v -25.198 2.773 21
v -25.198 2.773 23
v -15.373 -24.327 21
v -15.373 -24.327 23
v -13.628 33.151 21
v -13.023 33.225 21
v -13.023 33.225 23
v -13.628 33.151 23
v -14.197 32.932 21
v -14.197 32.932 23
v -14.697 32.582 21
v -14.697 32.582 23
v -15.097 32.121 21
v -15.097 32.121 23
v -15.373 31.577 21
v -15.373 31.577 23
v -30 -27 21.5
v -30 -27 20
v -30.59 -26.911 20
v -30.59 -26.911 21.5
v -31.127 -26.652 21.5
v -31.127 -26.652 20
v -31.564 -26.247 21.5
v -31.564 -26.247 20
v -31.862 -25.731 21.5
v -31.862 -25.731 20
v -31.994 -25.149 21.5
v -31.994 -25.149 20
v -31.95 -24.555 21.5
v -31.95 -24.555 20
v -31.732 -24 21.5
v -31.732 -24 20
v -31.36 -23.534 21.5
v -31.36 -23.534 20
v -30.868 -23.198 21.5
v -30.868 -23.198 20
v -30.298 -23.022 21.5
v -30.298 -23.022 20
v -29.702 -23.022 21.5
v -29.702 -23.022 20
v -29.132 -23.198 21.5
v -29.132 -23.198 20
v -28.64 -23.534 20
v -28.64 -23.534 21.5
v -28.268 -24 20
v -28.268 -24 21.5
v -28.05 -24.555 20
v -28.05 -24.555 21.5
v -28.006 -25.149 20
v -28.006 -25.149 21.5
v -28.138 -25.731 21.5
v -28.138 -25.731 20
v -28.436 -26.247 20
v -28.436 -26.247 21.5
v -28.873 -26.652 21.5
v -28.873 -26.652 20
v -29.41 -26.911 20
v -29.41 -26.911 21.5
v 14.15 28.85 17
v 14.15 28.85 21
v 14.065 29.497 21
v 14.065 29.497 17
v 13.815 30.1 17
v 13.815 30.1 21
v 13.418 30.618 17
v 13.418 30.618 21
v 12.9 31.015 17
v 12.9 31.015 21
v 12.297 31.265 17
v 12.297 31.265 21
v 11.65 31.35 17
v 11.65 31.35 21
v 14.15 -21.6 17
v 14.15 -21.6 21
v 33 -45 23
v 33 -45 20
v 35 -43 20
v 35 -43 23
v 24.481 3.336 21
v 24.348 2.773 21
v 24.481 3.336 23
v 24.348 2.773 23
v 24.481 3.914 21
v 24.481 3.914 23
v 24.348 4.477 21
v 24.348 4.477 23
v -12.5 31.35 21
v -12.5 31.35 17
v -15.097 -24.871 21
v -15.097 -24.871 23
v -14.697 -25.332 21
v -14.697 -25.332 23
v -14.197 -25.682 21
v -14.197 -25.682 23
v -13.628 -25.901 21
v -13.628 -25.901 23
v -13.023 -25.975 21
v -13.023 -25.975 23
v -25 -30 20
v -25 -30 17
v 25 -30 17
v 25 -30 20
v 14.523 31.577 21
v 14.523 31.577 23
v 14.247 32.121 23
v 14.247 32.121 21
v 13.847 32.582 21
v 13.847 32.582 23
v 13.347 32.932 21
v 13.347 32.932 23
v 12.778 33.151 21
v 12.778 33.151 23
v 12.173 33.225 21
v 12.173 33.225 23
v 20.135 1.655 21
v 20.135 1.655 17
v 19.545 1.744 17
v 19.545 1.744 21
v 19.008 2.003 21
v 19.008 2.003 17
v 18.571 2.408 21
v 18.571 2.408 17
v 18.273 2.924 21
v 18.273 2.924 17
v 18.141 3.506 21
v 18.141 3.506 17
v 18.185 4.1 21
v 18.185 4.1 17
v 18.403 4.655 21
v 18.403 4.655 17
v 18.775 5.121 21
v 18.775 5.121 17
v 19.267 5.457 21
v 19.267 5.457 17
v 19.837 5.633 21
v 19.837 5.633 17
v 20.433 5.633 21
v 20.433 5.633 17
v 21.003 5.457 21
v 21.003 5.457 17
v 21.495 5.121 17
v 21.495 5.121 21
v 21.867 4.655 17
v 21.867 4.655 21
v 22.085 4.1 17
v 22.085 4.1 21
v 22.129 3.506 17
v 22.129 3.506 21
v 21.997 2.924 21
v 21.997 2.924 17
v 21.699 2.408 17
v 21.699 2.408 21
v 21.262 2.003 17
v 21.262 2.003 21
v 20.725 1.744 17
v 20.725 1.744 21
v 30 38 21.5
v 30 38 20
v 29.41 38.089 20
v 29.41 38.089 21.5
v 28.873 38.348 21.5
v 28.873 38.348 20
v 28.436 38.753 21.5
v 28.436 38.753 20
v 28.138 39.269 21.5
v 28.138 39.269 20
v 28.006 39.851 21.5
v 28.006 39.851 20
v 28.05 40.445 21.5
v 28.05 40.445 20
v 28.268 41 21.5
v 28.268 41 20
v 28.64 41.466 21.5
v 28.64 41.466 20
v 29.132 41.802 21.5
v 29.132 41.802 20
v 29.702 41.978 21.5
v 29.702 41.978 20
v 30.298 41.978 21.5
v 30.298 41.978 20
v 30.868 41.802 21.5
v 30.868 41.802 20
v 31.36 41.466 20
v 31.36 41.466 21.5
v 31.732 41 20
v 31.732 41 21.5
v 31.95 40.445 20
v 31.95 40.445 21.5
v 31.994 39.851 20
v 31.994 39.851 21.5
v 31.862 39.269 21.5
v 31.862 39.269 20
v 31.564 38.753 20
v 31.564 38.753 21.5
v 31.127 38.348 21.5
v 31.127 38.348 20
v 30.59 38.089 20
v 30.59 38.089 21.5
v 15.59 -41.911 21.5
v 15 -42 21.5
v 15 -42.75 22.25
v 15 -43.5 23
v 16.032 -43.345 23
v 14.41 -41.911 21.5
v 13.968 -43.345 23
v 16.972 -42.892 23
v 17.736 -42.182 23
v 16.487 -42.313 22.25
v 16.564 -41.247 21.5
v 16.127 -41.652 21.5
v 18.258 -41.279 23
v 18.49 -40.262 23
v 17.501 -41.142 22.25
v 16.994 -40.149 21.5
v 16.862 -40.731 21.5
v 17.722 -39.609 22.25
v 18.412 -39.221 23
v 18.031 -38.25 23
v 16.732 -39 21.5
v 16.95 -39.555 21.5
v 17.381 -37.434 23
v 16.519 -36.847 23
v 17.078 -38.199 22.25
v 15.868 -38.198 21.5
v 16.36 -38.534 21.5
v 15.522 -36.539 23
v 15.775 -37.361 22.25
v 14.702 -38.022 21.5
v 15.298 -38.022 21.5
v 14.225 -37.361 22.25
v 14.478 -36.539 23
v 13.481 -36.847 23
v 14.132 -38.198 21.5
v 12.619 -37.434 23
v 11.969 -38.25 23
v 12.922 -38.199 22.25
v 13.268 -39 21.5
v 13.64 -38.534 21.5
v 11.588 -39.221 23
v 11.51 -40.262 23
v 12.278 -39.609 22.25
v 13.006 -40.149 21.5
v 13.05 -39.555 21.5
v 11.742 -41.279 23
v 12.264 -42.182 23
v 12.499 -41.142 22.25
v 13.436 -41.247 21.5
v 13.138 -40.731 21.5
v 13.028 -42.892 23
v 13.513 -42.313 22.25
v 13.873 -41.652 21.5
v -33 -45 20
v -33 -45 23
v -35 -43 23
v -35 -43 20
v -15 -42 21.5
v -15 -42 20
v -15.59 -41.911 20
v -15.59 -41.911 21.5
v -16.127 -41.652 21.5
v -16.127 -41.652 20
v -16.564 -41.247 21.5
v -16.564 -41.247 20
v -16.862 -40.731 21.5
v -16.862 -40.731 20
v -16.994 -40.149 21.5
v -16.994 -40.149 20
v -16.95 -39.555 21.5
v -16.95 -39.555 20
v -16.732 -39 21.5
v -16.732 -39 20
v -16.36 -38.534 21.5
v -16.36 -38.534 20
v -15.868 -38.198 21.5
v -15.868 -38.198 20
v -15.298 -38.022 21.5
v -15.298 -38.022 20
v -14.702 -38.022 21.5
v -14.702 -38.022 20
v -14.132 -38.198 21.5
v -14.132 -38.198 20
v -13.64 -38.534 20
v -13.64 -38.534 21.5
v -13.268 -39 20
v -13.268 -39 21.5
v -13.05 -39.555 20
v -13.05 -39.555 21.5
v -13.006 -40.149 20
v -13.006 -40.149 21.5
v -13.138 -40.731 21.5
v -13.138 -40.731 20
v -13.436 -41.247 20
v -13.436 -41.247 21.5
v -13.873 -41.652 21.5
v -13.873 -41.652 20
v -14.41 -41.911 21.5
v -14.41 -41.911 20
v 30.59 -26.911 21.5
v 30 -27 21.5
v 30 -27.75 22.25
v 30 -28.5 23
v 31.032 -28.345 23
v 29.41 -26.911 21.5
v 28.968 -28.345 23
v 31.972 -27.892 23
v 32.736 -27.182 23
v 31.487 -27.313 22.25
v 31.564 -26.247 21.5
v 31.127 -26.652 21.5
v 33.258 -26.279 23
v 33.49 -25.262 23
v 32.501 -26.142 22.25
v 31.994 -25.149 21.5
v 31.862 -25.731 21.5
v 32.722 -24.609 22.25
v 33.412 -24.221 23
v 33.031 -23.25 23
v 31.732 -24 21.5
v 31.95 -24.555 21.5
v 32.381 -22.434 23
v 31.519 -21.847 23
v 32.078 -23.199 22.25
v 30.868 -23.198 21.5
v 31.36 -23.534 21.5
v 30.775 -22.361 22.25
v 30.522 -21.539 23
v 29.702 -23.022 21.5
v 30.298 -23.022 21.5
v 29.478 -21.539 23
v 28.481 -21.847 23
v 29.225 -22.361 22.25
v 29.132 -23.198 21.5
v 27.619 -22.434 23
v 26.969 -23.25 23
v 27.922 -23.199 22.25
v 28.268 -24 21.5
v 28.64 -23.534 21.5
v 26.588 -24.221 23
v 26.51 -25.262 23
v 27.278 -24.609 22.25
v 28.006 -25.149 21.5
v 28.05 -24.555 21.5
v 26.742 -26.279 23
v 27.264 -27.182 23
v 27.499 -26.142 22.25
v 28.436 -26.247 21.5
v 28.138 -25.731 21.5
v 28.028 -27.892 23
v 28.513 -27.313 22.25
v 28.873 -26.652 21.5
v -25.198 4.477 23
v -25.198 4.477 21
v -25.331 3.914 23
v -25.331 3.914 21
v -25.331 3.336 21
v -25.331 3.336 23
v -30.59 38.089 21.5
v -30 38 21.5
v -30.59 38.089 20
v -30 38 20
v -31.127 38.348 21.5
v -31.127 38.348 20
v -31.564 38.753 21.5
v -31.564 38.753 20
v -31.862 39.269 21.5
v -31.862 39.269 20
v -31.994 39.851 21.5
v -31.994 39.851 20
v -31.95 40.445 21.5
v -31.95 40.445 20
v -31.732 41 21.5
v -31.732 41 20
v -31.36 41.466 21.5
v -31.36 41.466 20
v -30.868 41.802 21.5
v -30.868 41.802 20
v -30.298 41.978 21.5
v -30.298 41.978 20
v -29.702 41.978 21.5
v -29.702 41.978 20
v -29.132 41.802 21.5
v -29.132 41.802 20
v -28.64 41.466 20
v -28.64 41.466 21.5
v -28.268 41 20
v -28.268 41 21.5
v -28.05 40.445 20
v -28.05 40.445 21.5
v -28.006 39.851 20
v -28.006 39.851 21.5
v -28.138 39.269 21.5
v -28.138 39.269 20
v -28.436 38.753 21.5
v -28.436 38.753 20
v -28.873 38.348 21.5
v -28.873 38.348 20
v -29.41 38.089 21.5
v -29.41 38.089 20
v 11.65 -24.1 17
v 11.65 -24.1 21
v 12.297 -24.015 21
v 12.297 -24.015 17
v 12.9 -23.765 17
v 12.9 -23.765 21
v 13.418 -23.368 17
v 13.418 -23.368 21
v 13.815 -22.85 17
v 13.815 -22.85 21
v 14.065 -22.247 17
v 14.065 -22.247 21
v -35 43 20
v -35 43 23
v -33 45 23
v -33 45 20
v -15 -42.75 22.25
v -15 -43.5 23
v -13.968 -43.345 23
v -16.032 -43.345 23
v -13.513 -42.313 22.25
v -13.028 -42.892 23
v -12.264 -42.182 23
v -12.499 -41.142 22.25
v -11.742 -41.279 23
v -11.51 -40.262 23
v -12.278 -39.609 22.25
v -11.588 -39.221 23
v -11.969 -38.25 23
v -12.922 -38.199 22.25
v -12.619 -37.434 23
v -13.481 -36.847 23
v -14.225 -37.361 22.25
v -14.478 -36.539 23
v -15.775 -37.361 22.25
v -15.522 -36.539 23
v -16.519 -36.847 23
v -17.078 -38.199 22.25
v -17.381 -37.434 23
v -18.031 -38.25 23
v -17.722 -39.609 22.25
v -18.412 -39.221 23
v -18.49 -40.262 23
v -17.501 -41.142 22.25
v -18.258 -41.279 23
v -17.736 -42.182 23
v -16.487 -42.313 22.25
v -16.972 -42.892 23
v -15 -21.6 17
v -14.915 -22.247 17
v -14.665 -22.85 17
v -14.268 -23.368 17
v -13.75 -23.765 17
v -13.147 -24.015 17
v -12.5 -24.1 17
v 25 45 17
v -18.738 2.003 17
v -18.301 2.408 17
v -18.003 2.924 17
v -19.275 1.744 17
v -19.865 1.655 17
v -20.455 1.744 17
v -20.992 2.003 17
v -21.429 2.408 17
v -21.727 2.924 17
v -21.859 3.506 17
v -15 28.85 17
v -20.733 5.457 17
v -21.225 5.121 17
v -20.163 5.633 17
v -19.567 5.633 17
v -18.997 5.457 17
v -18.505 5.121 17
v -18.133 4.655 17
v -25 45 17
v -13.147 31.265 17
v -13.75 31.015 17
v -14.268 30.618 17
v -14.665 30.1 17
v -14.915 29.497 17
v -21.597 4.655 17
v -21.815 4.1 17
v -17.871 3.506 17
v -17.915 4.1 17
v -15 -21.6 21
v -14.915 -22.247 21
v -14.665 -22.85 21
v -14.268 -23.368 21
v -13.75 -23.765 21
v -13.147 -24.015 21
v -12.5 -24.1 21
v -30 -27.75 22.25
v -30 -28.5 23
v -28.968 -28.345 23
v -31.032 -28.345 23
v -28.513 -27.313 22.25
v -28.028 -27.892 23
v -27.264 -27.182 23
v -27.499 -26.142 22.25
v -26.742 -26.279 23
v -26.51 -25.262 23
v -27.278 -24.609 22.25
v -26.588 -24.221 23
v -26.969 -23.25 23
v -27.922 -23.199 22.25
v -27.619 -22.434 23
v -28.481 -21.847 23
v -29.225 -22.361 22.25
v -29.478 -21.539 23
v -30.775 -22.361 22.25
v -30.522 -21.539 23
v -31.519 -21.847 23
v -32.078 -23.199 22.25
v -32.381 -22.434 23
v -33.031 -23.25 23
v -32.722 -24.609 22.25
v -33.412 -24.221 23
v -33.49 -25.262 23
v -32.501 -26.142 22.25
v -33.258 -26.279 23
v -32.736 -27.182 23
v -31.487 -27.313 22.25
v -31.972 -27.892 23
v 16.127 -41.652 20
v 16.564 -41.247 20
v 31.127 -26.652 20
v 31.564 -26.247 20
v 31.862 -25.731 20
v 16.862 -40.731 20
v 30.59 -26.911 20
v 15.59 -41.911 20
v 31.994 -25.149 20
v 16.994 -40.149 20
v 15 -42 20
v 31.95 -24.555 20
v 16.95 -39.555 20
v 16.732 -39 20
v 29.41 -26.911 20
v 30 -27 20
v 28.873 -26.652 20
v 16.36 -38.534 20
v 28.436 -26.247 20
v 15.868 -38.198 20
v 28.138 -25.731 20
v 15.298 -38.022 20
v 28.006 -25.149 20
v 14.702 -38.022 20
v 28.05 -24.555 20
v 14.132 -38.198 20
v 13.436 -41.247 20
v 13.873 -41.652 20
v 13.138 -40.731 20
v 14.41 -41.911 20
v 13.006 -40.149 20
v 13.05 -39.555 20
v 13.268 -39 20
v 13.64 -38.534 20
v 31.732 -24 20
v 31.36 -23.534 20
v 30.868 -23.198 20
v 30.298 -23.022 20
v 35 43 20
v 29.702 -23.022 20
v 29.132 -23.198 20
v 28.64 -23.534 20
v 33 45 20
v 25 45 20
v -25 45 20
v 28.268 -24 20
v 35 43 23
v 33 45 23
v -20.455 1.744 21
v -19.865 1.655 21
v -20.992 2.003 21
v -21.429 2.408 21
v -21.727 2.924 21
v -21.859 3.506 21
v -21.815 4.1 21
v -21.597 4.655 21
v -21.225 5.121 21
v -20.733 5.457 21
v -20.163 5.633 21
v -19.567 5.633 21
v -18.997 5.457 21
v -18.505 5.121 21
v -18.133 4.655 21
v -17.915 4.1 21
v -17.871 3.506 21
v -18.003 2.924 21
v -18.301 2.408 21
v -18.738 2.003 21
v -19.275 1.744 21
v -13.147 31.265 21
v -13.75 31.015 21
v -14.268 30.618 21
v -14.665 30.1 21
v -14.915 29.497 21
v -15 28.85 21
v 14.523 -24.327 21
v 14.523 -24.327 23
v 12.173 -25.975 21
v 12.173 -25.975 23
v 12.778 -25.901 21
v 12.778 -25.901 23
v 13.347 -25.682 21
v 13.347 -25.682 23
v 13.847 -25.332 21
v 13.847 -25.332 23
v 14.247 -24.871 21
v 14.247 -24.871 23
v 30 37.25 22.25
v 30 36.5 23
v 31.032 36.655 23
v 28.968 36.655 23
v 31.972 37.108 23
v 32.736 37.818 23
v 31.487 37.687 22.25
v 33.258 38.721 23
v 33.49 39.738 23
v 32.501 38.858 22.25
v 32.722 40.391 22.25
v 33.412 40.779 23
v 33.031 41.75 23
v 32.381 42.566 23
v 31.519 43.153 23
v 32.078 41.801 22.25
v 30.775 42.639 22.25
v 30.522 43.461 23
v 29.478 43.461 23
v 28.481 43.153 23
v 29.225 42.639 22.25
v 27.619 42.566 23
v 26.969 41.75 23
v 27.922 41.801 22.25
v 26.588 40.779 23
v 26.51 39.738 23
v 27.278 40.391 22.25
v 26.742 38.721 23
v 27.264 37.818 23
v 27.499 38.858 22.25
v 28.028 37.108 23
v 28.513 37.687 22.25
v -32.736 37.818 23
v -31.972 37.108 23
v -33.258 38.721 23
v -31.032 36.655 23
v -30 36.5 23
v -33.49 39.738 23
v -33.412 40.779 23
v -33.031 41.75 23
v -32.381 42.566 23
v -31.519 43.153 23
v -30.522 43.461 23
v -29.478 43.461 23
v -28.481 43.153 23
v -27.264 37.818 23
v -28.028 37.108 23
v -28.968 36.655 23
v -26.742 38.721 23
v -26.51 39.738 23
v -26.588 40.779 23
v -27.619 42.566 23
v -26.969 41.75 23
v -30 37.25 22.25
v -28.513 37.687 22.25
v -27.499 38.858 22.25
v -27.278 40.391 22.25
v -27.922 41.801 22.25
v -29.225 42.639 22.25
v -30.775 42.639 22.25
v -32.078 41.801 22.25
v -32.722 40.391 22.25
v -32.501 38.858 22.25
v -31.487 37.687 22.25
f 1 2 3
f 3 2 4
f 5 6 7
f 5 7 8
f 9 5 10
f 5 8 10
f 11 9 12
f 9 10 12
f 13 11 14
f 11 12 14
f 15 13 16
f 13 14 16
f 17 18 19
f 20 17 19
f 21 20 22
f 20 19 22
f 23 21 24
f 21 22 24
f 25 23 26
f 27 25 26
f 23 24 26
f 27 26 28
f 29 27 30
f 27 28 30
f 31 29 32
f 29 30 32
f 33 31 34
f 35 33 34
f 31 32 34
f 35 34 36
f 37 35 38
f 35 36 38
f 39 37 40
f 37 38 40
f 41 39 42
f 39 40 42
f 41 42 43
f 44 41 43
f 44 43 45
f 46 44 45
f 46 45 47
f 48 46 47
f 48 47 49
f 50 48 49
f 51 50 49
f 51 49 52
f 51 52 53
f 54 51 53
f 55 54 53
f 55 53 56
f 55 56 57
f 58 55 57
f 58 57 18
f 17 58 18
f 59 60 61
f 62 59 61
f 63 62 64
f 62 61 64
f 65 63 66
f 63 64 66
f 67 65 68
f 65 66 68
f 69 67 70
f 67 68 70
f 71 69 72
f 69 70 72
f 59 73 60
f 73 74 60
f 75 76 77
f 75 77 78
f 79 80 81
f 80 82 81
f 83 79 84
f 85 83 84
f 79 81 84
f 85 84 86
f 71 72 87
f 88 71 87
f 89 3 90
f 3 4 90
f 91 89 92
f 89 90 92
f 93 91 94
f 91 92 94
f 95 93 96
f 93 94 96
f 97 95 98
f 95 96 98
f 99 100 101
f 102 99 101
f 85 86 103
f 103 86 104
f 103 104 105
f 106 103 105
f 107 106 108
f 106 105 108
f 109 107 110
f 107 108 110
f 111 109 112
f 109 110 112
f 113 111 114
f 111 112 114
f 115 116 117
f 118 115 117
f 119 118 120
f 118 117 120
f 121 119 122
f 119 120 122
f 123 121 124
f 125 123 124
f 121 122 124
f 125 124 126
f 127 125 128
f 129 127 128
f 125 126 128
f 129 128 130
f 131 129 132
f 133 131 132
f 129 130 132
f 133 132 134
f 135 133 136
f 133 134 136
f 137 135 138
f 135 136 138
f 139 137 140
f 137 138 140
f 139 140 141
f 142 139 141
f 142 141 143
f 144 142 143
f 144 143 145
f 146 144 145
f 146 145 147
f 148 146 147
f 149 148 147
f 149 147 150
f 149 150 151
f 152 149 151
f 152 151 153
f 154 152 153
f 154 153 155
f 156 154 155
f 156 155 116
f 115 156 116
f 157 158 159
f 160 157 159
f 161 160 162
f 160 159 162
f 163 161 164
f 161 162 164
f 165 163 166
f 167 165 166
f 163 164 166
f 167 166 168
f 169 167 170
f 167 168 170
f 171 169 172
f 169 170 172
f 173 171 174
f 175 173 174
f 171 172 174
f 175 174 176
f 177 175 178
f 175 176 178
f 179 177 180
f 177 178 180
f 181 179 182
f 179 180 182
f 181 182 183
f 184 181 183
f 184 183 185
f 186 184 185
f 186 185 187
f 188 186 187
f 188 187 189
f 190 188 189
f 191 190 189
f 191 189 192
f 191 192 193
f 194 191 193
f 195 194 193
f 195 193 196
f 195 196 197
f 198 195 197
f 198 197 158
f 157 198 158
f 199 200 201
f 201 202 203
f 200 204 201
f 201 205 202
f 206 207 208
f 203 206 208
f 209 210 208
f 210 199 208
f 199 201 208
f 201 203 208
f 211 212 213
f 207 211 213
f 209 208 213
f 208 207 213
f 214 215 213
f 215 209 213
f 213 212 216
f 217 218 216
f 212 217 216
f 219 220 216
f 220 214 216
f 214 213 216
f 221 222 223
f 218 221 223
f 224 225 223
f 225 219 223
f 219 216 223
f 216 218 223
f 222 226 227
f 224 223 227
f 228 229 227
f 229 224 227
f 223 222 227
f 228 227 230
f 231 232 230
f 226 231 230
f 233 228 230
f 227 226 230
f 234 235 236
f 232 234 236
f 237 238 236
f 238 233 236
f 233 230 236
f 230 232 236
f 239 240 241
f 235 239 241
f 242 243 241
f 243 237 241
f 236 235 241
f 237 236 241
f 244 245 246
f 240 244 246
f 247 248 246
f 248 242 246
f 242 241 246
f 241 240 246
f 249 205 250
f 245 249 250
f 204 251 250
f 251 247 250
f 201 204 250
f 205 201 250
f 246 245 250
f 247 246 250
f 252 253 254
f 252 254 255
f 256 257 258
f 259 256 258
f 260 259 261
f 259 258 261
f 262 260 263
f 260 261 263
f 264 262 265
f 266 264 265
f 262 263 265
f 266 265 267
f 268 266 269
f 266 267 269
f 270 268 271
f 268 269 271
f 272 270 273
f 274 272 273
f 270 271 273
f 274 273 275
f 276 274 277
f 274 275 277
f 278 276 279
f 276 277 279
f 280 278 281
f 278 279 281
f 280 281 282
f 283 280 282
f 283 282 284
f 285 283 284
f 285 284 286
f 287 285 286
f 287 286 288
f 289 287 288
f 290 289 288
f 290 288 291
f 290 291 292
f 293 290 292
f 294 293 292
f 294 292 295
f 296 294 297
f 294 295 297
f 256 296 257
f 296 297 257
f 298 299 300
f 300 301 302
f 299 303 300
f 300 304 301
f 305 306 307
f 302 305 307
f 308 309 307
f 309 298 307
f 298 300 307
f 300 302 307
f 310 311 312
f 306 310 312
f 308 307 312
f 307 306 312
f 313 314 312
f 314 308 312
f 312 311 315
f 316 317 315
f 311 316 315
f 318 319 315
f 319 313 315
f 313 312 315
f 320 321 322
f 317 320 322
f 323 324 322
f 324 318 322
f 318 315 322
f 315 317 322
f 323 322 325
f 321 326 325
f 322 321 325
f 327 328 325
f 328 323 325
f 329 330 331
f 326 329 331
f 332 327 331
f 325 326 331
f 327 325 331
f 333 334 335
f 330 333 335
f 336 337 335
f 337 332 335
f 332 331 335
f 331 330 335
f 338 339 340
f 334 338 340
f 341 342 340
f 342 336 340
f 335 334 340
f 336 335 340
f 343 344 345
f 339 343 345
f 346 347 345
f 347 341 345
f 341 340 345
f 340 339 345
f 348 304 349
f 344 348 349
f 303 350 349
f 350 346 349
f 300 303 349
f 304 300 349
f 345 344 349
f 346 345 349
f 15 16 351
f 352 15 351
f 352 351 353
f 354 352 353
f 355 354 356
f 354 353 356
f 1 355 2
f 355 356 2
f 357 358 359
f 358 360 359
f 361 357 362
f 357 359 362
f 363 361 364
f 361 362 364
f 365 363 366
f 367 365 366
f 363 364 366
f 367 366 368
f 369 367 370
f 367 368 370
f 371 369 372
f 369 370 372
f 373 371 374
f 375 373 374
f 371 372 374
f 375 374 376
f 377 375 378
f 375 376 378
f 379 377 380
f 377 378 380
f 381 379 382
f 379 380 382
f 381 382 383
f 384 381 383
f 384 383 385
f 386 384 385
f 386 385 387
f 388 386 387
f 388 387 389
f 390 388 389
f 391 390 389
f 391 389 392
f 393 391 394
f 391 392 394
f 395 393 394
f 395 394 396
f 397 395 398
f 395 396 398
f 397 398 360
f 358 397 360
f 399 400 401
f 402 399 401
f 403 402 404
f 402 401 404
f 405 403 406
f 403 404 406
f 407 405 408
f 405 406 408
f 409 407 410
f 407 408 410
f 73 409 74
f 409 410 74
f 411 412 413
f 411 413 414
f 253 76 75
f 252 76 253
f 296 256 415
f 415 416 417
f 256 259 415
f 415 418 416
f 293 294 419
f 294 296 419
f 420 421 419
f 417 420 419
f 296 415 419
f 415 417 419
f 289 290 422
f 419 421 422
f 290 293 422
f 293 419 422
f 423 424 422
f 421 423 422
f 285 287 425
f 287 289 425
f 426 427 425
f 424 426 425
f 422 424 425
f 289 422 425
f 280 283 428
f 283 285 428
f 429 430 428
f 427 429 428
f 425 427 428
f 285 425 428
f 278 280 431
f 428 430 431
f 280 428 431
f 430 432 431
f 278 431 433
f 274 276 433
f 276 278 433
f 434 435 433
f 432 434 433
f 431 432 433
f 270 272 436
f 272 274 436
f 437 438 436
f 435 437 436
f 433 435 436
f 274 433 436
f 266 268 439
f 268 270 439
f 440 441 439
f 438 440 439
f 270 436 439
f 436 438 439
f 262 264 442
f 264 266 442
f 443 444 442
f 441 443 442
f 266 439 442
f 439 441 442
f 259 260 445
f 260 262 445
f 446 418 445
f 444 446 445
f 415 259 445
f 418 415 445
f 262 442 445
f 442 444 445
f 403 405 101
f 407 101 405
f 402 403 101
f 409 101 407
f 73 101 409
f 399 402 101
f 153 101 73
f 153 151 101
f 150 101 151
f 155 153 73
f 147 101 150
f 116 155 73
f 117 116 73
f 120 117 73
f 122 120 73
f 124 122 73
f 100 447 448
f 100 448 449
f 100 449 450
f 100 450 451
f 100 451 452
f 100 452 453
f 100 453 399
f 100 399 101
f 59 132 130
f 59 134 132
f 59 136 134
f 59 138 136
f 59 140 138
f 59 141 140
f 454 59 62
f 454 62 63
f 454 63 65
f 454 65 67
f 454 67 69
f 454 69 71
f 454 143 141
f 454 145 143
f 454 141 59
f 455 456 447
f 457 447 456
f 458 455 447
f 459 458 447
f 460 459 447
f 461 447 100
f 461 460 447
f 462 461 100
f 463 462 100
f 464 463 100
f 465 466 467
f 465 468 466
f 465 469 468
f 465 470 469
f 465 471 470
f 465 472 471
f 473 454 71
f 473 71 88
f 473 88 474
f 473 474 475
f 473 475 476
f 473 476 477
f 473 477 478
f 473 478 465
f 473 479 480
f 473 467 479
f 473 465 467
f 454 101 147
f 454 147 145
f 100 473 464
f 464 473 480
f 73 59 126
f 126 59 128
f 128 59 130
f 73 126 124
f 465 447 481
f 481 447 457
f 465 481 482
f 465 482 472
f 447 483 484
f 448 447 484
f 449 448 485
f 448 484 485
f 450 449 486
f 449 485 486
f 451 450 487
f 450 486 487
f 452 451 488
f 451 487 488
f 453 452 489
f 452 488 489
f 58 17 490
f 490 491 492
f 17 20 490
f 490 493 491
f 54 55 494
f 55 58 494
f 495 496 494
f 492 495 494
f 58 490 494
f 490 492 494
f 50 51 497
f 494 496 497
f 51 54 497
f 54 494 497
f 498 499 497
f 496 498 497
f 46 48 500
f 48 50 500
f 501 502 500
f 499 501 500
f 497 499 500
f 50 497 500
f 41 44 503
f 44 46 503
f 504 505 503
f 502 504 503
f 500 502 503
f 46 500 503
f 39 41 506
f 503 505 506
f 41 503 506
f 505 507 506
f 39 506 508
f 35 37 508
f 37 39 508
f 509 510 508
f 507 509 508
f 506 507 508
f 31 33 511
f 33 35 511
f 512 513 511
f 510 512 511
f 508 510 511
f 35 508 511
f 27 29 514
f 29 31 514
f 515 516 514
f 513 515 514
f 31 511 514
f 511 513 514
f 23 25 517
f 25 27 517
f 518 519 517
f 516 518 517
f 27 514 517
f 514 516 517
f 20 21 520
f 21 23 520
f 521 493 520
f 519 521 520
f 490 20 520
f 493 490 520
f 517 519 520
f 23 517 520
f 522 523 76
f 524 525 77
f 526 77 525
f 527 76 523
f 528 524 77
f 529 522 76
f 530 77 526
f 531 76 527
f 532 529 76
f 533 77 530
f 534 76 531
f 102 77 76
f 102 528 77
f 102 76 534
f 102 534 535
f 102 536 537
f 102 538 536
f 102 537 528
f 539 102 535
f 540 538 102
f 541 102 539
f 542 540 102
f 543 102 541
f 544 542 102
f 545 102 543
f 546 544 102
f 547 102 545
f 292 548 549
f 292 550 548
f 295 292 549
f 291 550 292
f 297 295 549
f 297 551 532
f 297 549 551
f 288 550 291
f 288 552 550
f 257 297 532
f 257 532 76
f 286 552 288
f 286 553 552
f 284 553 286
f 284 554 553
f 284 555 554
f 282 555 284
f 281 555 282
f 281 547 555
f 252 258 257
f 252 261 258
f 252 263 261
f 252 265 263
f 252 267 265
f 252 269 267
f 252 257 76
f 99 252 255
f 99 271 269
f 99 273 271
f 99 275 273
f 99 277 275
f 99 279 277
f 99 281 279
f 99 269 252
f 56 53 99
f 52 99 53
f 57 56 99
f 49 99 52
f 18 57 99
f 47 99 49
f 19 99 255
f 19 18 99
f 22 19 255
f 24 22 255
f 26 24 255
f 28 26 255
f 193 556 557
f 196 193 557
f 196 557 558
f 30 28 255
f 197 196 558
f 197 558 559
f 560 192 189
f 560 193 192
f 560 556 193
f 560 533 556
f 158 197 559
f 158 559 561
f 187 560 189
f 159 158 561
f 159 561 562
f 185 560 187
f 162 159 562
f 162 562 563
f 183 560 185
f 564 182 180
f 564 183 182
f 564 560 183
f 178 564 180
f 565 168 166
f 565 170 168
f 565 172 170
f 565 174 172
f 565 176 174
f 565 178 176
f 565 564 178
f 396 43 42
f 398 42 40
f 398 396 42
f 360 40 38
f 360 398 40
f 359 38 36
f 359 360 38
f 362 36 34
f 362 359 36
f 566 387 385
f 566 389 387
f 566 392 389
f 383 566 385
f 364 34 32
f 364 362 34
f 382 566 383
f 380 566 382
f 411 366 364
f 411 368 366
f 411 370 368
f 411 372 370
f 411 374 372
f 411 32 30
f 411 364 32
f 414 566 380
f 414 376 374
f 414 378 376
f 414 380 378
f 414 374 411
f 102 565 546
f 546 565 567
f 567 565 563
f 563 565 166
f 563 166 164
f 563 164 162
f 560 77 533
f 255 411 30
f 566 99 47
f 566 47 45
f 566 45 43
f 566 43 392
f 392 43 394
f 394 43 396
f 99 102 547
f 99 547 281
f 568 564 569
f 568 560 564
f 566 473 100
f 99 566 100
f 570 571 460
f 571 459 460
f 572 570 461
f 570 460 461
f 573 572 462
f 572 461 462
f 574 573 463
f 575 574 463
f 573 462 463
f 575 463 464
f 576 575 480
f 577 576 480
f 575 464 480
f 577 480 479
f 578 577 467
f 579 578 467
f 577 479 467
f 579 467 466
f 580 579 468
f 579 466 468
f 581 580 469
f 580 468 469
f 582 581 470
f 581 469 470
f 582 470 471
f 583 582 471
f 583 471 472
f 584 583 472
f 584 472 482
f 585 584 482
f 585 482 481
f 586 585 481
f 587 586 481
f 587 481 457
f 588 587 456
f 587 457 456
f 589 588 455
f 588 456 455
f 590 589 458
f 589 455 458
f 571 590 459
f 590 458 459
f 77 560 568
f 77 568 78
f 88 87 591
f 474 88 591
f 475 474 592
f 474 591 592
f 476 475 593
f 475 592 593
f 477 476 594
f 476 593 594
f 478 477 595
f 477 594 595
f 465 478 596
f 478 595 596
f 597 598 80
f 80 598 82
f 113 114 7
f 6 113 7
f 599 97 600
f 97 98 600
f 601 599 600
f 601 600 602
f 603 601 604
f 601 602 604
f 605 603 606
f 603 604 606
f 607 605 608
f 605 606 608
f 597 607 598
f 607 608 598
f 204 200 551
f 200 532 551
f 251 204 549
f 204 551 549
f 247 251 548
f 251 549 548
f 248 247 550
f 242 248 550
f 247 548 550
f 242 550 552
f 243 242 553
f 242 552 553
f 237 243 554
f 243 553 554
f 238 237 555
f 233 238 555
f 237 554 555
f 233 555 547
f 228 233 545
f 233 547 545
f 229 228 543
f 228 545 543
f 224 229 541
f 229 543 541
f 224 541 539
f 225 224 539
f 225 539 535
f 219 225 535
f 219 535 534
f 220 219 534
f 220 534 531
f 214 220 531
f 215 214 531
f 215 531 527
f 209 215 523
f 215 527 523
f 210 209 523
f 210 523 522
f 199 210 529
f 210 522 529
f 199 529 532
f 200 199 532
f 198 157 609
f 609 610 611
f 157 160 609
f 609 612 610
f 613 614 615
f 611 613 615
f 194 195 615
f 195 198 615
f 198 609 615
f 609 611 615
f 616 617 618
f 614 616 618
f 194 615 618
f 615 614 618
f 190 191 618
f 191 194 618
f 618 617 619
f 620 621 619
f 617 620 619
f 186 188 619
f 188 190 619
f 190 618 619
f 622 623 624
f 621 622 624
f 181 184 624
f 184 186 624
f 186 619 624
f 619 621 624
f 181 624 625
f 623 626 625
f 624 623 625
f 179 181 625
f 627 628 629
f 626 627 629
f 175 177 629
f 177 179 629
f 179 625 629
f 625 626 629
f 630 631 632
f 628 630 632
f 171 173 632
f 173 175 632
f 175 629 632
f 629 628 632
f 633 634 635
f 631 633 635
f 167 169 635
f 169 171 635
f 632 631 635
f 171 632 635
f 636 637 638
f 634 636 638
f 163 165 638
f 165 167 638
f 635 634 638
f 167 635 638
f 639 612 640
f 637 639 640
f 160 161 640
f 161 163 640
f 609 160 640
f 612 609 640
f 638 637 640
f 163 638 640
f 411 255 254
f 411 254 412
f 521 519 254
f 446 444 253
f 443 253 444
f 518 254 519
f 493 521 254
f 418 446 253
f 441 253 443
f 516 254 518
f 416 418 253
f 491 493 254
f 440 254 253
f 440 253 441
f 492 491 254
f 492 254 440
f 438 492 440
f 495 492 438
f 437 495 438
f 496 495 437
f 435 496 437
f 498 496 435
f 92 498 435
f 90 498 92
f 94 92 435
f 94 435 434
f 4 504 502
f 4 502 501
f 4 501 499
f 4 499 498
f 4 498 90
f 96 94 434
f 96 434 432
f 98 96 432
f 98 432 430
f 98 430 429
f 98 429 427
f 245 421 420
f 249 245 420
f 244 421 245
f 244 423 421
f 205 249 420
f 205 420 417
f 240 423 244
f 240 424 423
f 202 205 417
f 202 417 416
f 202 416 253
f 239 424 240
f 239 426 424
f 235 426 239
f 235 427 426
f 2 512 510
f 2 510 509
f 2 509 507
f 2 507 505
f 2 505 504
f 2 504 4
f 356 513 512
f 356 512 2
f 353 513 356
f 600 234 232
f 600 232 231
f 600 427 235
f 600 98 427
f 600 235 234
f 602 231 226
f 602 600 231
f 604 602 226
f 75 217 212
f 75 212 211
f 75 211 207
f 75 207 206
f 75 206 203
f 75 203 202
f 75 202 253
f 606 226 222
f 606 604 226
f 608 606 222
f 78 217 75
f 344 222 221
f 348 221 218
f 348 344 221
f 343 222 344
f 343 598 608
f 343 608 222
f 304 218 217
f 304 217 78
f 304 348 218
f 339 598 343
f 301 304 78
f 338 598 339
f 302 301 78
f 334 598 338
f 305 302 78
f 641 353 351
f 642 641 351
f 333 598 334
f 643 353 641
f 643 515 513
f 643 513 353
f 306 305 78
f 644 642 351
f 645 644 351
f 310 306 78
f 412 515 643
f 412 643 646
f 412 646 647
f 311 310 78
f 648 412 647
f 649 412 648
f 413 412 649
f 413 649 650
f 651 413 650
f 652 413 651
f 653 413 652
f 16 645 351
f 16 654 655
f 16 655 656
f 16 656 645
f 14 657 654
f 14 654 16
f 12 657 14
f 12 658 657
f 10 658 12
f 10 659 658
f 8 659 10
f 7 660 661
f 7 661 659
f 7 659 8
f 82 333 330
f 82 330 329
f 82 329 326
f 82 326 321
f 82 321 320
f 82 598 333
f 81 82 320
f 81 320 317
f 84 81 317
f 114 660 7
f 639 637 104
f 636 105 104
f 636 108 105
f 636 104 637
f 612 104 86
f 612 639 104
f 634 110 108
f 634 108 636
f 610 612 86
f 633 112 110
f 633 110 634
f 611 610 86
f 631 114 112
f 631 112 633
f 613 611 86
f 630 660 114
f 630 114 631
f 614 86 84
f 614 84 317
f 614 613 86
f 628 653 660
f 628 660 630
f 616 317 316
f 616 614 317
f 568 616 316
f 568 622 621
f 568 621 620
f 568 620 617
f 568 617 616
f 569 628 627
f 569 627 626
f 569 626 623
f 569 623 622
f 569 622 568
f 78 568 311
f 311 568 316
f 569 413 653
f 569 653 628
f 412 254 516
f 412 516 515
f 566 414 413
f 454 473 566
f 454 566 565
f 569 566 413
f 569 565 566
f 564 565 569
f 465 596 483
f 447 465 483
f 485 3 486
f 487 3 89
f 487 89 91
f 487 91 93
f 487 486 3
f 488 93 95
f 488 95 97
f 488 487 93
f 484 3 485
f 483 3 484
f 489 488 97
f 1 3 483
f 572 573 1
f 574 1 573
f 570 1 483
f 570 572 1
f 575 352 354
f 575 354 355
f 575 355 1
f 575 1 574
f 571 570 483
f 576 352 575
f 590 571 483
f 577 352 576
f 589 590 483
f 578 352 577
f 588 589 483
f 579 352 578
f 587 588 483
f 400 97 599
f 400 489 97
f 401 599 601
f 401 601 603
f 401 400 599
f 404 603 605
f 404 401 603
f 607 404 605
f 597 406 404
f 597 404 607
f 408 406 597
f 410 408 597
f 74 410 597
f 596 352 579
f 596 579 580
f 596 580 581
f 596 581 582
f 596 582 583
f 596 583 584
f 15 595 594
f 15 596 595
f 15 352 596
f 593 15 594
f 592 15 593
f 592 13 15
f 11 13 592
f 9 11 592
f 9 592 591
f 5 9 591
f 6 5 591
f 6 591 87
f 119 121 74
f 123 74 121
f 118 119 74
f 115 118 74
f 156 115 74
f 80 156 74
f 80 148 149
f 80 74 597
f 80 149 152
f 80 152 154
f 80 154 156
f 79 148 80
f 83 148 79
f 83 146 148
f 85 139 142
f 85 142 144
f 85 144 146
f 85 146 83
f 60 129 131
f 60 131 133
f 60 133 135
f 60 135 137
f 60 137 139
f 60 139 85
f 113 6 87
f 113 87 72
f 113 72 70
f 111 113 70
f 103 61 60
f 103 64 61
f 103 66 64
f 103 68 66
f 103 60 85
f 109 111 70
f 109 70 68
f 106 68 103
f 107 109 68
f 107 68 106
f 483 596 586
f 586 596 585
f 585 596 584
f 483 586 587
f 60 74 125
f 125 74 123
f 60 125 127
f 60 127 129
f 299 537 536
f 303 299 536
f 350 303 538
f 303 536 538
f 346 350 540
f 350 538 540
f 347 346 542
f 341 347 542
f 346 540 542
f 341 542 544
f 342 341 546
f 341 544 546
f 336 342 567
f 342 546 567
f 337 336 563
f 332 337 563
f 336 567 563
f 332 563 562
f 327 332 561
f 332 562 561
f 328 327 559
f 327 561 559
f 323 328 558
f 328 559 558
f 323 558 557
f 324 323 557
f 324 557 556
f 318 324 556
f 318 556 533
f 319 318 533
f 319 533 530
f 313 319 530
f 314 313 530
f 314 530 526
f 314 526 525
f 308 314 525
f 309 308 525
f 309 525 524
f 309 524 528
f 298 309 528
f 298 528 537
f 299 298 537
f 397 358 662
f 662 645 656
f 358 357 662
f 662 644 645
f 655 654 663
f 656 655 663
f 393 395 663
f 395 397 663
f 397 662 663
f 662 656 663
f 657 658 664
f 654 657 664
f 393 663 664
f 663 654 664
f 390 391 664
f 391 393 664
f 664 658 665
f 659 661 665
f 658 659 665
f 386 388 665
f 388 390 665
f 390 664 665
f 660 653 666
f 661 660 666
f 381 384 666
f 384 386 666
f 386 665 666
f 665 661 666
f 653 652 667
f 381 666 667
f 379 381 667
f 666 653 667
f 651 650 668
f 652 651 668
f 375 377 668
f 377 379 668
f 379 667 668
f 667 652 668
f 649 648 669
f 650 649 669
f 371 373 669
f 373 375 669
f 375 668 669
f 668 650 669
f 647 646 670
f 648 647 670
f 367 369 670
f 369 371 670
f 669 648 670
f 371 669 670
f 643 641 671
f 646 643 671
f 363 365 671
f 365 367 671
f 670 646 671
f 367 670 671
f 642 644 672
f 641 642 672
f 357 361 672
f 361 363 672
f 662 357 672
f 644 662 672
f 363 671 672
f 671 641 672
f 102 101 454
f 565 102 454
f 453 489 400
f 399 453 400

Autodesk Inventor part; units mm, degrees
ref_plane "YZ Plane" through (0, 0, 0) normal (1, 0, 0) x (0, 1, 0)
ref_plane "XZ Plane" through (0, 0, 0) normal (0, 1, 0) x (-1, 0, 0)
ref_plane "XY Plane" through (0, 0, 0) normal (0, 0, 1) x (1, 0, 0)
sketch "Sketch1" plane through (0, 0, 0) normal (0, 0, 1) x (1, 0, 0)
  line L0 (-35, 45) -> (35, 45)
  line L1 (35, 45) -> (35, -45)
  line L2 (35, -45) -> (-35, -45)
  line L3 (-35, -45) -> (-35, 45)
  point P0 (0, 0)
  point P1 (0, 45)
  point P2 (-35, 0)
  dimension "d0" = 70
  dimension "d1" = 90
extrude "Extrusion1" add sketch "Sketch1" along normal blind 23
sketch "Sketch2" plane through (0, 0, 23) normal (0, 0, 1) x (1, 0, 0)
  circle A0 centre (-20.425, 3.625) radius 3.15
  circle A1 centre (19.575, 3.625) radius 3.15
  line L0 (12.1727, -25.475) -> (-13.0227, -25.475)
  arc A2 (-14.903, -24.1567) -> (-13.0227, -25.475) centre (-13.0227, -23.475) ccw
  line L1 (-14.903, -24.1567) -> (-24.7279, 2.9433)
  arc A3 (-24.7279, 4.3067) -> (-24.7279, 2.9433) centre (-22.8476, 3.625) ccw
  line L2 (-24.7279, 4.3067) -> (-14.903, 31.4067)
  arc A4 (-13.0227, 32.725) -> (-14.903, 31.4067) centre (-13.0227, 30.725) ccw
  line L3 (-13.0227, 32.725) -> (12.1727, 32.725)
  arc A5 (14.053, 31.4067) -> (12.1727, 32.725) centre (12.1727, 30.725) ccw
  line L4 (14.053, 31.4067) -> (23.8779, 4.3067)
  arc A6 (23.8779, 2.9433) -> (23.8779, 4.3067) centre (21.9976, 3.625) ccw
  line L5 (23.8779, 2.9433) -> (14.053, -24.1567)
  arc A7 (12.1727, -25.475) -> (14.053, -24.1567) centre (12.1727, -23.475) ccw
  line L6 (-12.5, 30.85) -> (11.65, 30.85)
  arc A8 (13.65, 28.85) -> (11.65, 30.85) centre (11.65, 28.85) ccw
  line L7 (13.65, 28.85) -> (13.65, -21.6)
  arc A9 (11.65, -23.6) -> (13.65, -21.6) centre (11.65, -21.6) ccw
  line L8 (11.65, -23.6) -> (-12.5, -23.6)
  arc A10 (-14.5, -21.6) -> (-12.5, -23.6) centre (-12.5, -21.6) ccw
  line L9 (-14.5, -21.6) -> (-14.5, 28.85)
  arc A11 (-12.5, 30.85) -> (-14.5, 28.85) centre (-12.5, 28.85) ccw
  line L10 (11.875, -14) -> (11.875, -4.28)
  arc A12 (11.875, -4.28) -> (9.875, -2.28) centre (9.875, -4.28) ccw
  line L11 (9.875, -2.28) -> (-10.725, -2.28)
  arc A13 (-10.725, -2.28) -> (-12.725, -4.28) centre (-10.725, -4.28) ccw
  line L12 (-12.725, -4.28) -> (-12.725, -14)
  line L13 (-12.725, -14) -> (-7.725, -19)
  line L14 (-7.725, -19) -> (6.875, -19)
  line L15 (6.875, -19) -> (11.875, -14)
  line L16 (0.575, -12.25) -> (0.575, -15.75)
  line L17 (0.575, -15.75) -> (-1.425, -15.75)
  line L18 (-1.425, -15.75) -> (-1.425, -12.25)
  line L19 (-1.425, -12.25) -> (0.575, -12.25)
  line L20 (-6.3111, -5.53) -> (-6.3111, -9.03)
  line L21 (-6.3111, -9.03) -> (-8.3111, -9.03)
  line L22 (-8.3111, -9.03) -> (-8.3111, -5.53)
  line L23 (-8.3111, -5.53) -> (-6.3111, -5.53)
  line L24 (5.4611, -9.03) -> (5.4611, -5.53)
  line L25 (5.4611, -5.53) -> (7.4611, -5.53)
  line L26 (7.4611, -5.53) -> (7.4611, -9.03)
  line L27 (7.4611, -9.03) -> (5.4611, -9.03)
  line L28 (11.65, 31.35) -> (-12.5, 31.35)
  arc A14 (-12.5, 31.35) -> (-15, 28.85) centre (-12.5, 28.85) ccw
  line L29 (-15, 28.85) -> (-15, -21.6)
  arc A15 (-15, -21.6) -> (-12.5, -24.1) centre (-12.5, -21.6) ccw
  line L30 (-12.5, -24.1) -> (11.65, -24.1)
  arc A16 (11.65, -24.1) -> (14.15, -21.6) centre (11.65, -21.6) ccw
  line L31 (14.15, -21.6) -> (14.15, 28.85)
  arc A17 (14.15, 28.85) -> (11.65, 31.35) centre (11.65, 28.85) ccw
  dimension "d90" = 0.5
extrude "Extrusion2" cut sketch "Sketch2" against normal through all contours L6 A8 L7 A9 L8 A10 L9 A11 | L15 L14 L13 L12 A13 L11 A12 L10 | L16 L17 L18 L19 | L20 L21 L22 L23 | L24 L25 L26 L27 | A17 L31 A16 L30 A15 L29 A14 L28
sketch "Sketch3" plane through (0, 0, 23) normal (0, 0, 1) x (1, 0, 0)
  circle A0 centre (-20.425, 3.625) radius 3.15
  circle A1 centre (19.575, 3.625) radius 3.15
  line L0 (12.1727, -25.475) -> (-13.0227, -25.475)
  arc A2 (-14.903, -24.1567) -> (-13.0227, -25.475) centre (-13.0227, -23.475) ccw
  line L1 (-14.903, -24.1567) -> (-24.7279, 2.9433)
  arc A3 (-24.7279, 4.3067) -> (-24.7279, 2.9433) centre (-22.8476, 3.625) ccw
  line L2 (-24.7279, 4.3067) -> (-14.903, 31.4067)
  arc A4 (-13.0227, 32.725) -> (-14.903, 31.4067) centre (-13.0227, 30.725) ccw
  line L3 (-13.0227, 32.725) -> (12.1727, 32.725)
  arc A5 (14.053, 31.4067) -> (12.1727, 32.725) centre (12.1727, 30.725) ccw
  line L4 (14.053, 31.4067) -> (23.8779, 4.3067)
  arc A6 (23.8779, 2.9433) -> (23.8779, 4.3067) centre (21.9976, 3.625) ccw
  line L5 (23.8779, 2.9433) -> (14.053, -24.1567)
  arc A7 (12.1727, -25.475) -> (14.053, -24.1567) centre (12.1727, -23.475) ccw
  line L6 (-12.5, 30.85) -> (11.65, 30.85)
  arc A8 (13.65, 28.85) -> (11.65, 30.85) centre (11.65, 28.85) ccw
  line L7 (13.65, 28.85) -> (13.65, -21.6)
  arc A9 (11.65, -23.6) -> (13.65, -21.6) centre (11.65, -21.6) ccw
  line L8 (11.65, -23.6) -> (-12.5, -23.6)
  arc A10 (-14.5, -21.6) -> (-12.5, -23.6) centre (-12.5, -21.6) ccw
  line L9 (-14.5, -21.6) -> (-14.5, 28.85)
  arc A11 (-12.5, 30.85) -> (-14.5, 28.85) centre (-12.5, 28.85) ccw
  line L10 (11.875, -14) -> (11.875, -4.28)
  arc A12 (11.875, -4.28) -> (9.875, -2.28) centre (9.875, -4.28) ccw
  line L11 (9.875, -2.28) -> (-10.725, -2.28)
  arc A13 (-10.725, -2.28) -> (-12.725, -4.28) centre (-10.725, -4.28) ccw
  line L12 (-12.725, -4.28) -> (-12.725, -14)
  line L13 (-12.725, -14) -> (-7.725, -19)
  line L14 (-7.725, -19) -> (6.875, -19)
  line L15 (6.875, -19) -> (11.875, -14)
  line L16 (0.575, -12.25) -> (0.575, -15.75)
  line L17 (0.575, -15.75) -> (-1.425, -15.75)
  line L18 (-1.425, -15.75) -> (-1.425, -12.25)
  line L19 (-1.425, -12.25) -> (0.575, -12.25)
  line L20 (-6.3111, -5.53) -> (-6.3111, -9.03)
  line L21 (-6.3111, -9.03) -> (-8.3111, -9.03)
  line L22 (-8.3111, -9.03) -> (-8.3111, -5.53)
  line L23 (-8.3111, -5.53) -> (-6.3111, -5.53)
  line L24 (5.4611, -9.03) -> (5.4611, -5.53)
  line L25 (5.4611, -5.53) -> (7.4611, -5.53)
  line L26 (7.4611, -5.53) -> (7.4611, -9.03)
  line L27 (7.4611, -9.03) -> (5.4611, -9.03)
  line L28 (12.1727, 33.225) -> (-13.0227, 33.225)
  arc A14 (-13.0227, 33.225) -> (-15.373, 31.5771) centre (-13.0227, 30.725) ccw
  line L29 (-15.373, 31.5771) -> (-25.1979, 4.4771)
  arc A15 (-25.1979, 4.4771) -> (-25.1979, 2.7729) centre (-22.8476, 3.625) ccw
  line L30 (-25.1979, 2.7729) -> (-15.373, -24.3271)
  arc A16 (-15.373, -24.3271) -> (-13.0227, -25.975) centre (-13.0227, -23.475) ccw
  line L31 (-13.0227, -25.975) -> (12.1727, -25.975)
  arc A17 (12.1727, -25.975) -> (14.523, -24.3271) centre (12.1727, -23.475) ccw
  line L32 (14.523, -24.3271) -> (24.3479, 2.7729)
  arc A18 (24.3479, 2.7729) -> (24.3479, 4.4771) centre (21.9976, 3.625) ccw
  line L33 (24.3479, 4.4771) -> (14.523, 31.5771)
  arc A19 (14.523, 31.5771) -> (12.1727, 33.225) centre (12.1727, 30.725) ccw
  dimension "d91" = 0.5
extrude "Extrusion3" cut sketch "Sketch3" against normal blind 2 contours A0 | A1 | L0 A2 L1 A3 L2 A4 L3 A5 L4 A6 L5 A7 | L6 A8 L7 A9 L8 A10 L9 A11 | L15 L14 L13 L12 A13 L11 A12 L10 | L16 L17 L18 L19 | L20 L21 L22 L23 | L24 L25 L26 L27 | A19 L33 A18 L32 A17 L31 A16 L30 A15 L29 A14 L28
sketch "Sketch4" plane through (0, 0, 0) normal (0, 0, -1) x (-1, 0, 0)
  line L0 (-25, 45) -> (25, 45)
  line L1 (25, 45) -> (25, -30)
  line L2 (25, -30) -> (-25, -30)
  line L3 (-25, -30) -> (-25, 45)
  line L4 (-35, -45) -> (-35, 45) projected
  line L5 (35, -45) -> (-35, -45) projected
  line L6 (-35, 45) -> (35, 45) projected
  line L7 (35, 45) -> (35, -45) projected
  point P0 (0, 0)
  point P1 (45, -30)
  point P2 (-25, 45)
  point P3 (0, -30)
  point P4 (0, -45)
  point P5 (25, 45)
  dimension "d11" = 15
  dimension "d89" = 10
extrude "Extrusion4" cut sketch "Sketch4" against normal blind 20 contours L3 L2 L1 L6 L7 L5 L4
sketch "Sketch6" plane through (0, 0, 23) normal (0, 0, 1) x (1, 0, 0)
  circle A0 centre (-19.865, 3.655) radius 1.6 projected
  circle A1 centre (20.135, 3.655) radius 1.6 projected
  point P0 (0, 0)
hole "Hole1" at (20.135, 3.655, 23) at (-19.865, 3.655, 23) direction (0, 0, -1) diameter 4 end through all
sketch "Sketch5" plane through (0, 0, 0) normal (0, 0, -1) x (-1, 0, 0)
  line L0 (-20, 45) -> (45, 45)
  line L1 (-20, 0) -> (-20, 45)
  line L2 (-25, 45) -> (35, 45) projected
  line L3 (-25, 45) -> (-25, -30) projected
  line L4 (-25, -30) -> (25, -30) projected
  line L5 (14.9072, -25) -> (34.9072, -25)
  line L6 (35, -30) -> (14.9072, -30)
  line L7 (14.9072, -25) -> (14.9072, -30)
  line L8 (-25, 0) -> (-20, 0)
  line L9 (35, 45) -> (35, -30)
  point P0 (-20, -30)
  point P1 (14.9072, -30)
  point P2 (-20, 45)
  point P3 (14.9072, -30)
  point P4 (35, 45)
  dimension "d17" = 5
  dimension "d35" = 5
  dimension "d80" = 30
  dimension "d96" = 20.0928
extrude "Extrusion5" cut sketch "Sketch5" against normal blind 17
sketch "Sketch9" plane through (0, 0, 17) normal (0, 0, -1) x (-1, 0, 0)
  line L0 (-25, 45) -> (25, 45) projected
  line L1 (25, -30) -> (-25, -30) projected
  line L2 (-9.15, -24.1) -> (20, -24.1)
  line L3 (20, -24.1) -> (20, -30)
  line L4 (20, -30) -> (-9.15, -30)
  line L5 (-9.15, -30) -> (-9.15, -24.1)
  line L6 (-25, -30) -> (-25, 45) projected
  line L7 (25, 45) -> (25, -30) projected
  line L8 (-14.15, 28.85) -> (-14.15, -21.6) projected
  arc A0 (-11.65, 31.35) -> (-14.15, 28.85) centre (-11.65, 28.85) ccw projected
  line L9 (12.5, 31.35) -> (-11.65, 31.35) projected
  arc A1 (15, 28.85) -> (12.5, 31.35) centre (12.5, 28.85) ccw projected
  line L10 (15, -21.6) -> (15, 28.85) projected
  arc A2 (12.5, -24.1) -> (15, -21.6) centre (12.5, -21.6) ccw projected
  line L11 (-11.65, -24.1) -> (12.5, -24.1) projected
  arc A3 (-14.15, -21.6) -> (-11.65, -24.1) centre (-11.65, -21.6) ccw projected
  point P0 (0, 0)
  point P1 (-9.15, -30)
  point P2 (20, -30)
extrude "Extrusion6" [suppressed]
sketch "Sketch10" plane through (-17.5, -24.1, 21) normal (0, 1, 0) x (1, 0, 0)
  line L0 (22.5, 19) -> (2.5, 19)
  line L1 (2.5, 19) -> (2.5, 29)
  line L2 (2.5, 29) -> (22.5, 29)
  line L3 (22.5, 29) -> (22.5, 19)
  point P0 (17.5, 21)
  point P1 (12.5, 29)
  point P2 (12.5, 34)
  dimension "d94" = 10
extrude "Extrusion7" [suppressed]
fillet "Fillet1" [suppressed]
sketch "Sketch11" plane through (0, 0, 23) normal (0, 0, 1) x (1, 0, 0)
  line L0 (-35, -45) -> (35, -45) projected
  line L1 (-35, 45) -> (-35, -45) projected
  line L2 (35, -45) -> (35, 45) projected
  line L3 (35, 45) -> (-35, 45) projected
  point P0 (0, 0)
  point P1 (-15, -40)
  point P2 (15, -40)
  point P3 (30, -25)
  point P4 (30, 40)
  point P5 (-30, 40)
  point P6 (-30, -25)
  dimension "d65" = 5
  dimension "d66" = 20
  dimension "d67" = 20
  dimension "d68" = 5
  dimension "d69" = 5
  dimension "d70" = 20
  dimension "d71" = 5
  dimension "d72" = 5
  dimension "d97" = 5
hole "Hole4" at (-15, -40, 23) at (15, -40, 23) at (30, -25, 23) at (30, 40, 23) at (-30, 40, 23) at (-30, -25, 23) direction (0, 0, -1) diameter 4 end through all countersink diameter 7 countersink angle 90
chamfer "Chamfer2" distance 2 angle 45 4 edges at (-35, 45, 21.5) (35, 45, 21.5) (35, -45, 21.5) (-35, -45, 21.5)
equation "\"d66\" = d67"
equation "\"d68\" = d65"
equation "\"d69\" = d65"
equation "\"d70\" = d67"
equation "\"d71\" = d65"
equation "\"d97\" = d72"
properties part number "10-06-015 Suport conector cablu"
